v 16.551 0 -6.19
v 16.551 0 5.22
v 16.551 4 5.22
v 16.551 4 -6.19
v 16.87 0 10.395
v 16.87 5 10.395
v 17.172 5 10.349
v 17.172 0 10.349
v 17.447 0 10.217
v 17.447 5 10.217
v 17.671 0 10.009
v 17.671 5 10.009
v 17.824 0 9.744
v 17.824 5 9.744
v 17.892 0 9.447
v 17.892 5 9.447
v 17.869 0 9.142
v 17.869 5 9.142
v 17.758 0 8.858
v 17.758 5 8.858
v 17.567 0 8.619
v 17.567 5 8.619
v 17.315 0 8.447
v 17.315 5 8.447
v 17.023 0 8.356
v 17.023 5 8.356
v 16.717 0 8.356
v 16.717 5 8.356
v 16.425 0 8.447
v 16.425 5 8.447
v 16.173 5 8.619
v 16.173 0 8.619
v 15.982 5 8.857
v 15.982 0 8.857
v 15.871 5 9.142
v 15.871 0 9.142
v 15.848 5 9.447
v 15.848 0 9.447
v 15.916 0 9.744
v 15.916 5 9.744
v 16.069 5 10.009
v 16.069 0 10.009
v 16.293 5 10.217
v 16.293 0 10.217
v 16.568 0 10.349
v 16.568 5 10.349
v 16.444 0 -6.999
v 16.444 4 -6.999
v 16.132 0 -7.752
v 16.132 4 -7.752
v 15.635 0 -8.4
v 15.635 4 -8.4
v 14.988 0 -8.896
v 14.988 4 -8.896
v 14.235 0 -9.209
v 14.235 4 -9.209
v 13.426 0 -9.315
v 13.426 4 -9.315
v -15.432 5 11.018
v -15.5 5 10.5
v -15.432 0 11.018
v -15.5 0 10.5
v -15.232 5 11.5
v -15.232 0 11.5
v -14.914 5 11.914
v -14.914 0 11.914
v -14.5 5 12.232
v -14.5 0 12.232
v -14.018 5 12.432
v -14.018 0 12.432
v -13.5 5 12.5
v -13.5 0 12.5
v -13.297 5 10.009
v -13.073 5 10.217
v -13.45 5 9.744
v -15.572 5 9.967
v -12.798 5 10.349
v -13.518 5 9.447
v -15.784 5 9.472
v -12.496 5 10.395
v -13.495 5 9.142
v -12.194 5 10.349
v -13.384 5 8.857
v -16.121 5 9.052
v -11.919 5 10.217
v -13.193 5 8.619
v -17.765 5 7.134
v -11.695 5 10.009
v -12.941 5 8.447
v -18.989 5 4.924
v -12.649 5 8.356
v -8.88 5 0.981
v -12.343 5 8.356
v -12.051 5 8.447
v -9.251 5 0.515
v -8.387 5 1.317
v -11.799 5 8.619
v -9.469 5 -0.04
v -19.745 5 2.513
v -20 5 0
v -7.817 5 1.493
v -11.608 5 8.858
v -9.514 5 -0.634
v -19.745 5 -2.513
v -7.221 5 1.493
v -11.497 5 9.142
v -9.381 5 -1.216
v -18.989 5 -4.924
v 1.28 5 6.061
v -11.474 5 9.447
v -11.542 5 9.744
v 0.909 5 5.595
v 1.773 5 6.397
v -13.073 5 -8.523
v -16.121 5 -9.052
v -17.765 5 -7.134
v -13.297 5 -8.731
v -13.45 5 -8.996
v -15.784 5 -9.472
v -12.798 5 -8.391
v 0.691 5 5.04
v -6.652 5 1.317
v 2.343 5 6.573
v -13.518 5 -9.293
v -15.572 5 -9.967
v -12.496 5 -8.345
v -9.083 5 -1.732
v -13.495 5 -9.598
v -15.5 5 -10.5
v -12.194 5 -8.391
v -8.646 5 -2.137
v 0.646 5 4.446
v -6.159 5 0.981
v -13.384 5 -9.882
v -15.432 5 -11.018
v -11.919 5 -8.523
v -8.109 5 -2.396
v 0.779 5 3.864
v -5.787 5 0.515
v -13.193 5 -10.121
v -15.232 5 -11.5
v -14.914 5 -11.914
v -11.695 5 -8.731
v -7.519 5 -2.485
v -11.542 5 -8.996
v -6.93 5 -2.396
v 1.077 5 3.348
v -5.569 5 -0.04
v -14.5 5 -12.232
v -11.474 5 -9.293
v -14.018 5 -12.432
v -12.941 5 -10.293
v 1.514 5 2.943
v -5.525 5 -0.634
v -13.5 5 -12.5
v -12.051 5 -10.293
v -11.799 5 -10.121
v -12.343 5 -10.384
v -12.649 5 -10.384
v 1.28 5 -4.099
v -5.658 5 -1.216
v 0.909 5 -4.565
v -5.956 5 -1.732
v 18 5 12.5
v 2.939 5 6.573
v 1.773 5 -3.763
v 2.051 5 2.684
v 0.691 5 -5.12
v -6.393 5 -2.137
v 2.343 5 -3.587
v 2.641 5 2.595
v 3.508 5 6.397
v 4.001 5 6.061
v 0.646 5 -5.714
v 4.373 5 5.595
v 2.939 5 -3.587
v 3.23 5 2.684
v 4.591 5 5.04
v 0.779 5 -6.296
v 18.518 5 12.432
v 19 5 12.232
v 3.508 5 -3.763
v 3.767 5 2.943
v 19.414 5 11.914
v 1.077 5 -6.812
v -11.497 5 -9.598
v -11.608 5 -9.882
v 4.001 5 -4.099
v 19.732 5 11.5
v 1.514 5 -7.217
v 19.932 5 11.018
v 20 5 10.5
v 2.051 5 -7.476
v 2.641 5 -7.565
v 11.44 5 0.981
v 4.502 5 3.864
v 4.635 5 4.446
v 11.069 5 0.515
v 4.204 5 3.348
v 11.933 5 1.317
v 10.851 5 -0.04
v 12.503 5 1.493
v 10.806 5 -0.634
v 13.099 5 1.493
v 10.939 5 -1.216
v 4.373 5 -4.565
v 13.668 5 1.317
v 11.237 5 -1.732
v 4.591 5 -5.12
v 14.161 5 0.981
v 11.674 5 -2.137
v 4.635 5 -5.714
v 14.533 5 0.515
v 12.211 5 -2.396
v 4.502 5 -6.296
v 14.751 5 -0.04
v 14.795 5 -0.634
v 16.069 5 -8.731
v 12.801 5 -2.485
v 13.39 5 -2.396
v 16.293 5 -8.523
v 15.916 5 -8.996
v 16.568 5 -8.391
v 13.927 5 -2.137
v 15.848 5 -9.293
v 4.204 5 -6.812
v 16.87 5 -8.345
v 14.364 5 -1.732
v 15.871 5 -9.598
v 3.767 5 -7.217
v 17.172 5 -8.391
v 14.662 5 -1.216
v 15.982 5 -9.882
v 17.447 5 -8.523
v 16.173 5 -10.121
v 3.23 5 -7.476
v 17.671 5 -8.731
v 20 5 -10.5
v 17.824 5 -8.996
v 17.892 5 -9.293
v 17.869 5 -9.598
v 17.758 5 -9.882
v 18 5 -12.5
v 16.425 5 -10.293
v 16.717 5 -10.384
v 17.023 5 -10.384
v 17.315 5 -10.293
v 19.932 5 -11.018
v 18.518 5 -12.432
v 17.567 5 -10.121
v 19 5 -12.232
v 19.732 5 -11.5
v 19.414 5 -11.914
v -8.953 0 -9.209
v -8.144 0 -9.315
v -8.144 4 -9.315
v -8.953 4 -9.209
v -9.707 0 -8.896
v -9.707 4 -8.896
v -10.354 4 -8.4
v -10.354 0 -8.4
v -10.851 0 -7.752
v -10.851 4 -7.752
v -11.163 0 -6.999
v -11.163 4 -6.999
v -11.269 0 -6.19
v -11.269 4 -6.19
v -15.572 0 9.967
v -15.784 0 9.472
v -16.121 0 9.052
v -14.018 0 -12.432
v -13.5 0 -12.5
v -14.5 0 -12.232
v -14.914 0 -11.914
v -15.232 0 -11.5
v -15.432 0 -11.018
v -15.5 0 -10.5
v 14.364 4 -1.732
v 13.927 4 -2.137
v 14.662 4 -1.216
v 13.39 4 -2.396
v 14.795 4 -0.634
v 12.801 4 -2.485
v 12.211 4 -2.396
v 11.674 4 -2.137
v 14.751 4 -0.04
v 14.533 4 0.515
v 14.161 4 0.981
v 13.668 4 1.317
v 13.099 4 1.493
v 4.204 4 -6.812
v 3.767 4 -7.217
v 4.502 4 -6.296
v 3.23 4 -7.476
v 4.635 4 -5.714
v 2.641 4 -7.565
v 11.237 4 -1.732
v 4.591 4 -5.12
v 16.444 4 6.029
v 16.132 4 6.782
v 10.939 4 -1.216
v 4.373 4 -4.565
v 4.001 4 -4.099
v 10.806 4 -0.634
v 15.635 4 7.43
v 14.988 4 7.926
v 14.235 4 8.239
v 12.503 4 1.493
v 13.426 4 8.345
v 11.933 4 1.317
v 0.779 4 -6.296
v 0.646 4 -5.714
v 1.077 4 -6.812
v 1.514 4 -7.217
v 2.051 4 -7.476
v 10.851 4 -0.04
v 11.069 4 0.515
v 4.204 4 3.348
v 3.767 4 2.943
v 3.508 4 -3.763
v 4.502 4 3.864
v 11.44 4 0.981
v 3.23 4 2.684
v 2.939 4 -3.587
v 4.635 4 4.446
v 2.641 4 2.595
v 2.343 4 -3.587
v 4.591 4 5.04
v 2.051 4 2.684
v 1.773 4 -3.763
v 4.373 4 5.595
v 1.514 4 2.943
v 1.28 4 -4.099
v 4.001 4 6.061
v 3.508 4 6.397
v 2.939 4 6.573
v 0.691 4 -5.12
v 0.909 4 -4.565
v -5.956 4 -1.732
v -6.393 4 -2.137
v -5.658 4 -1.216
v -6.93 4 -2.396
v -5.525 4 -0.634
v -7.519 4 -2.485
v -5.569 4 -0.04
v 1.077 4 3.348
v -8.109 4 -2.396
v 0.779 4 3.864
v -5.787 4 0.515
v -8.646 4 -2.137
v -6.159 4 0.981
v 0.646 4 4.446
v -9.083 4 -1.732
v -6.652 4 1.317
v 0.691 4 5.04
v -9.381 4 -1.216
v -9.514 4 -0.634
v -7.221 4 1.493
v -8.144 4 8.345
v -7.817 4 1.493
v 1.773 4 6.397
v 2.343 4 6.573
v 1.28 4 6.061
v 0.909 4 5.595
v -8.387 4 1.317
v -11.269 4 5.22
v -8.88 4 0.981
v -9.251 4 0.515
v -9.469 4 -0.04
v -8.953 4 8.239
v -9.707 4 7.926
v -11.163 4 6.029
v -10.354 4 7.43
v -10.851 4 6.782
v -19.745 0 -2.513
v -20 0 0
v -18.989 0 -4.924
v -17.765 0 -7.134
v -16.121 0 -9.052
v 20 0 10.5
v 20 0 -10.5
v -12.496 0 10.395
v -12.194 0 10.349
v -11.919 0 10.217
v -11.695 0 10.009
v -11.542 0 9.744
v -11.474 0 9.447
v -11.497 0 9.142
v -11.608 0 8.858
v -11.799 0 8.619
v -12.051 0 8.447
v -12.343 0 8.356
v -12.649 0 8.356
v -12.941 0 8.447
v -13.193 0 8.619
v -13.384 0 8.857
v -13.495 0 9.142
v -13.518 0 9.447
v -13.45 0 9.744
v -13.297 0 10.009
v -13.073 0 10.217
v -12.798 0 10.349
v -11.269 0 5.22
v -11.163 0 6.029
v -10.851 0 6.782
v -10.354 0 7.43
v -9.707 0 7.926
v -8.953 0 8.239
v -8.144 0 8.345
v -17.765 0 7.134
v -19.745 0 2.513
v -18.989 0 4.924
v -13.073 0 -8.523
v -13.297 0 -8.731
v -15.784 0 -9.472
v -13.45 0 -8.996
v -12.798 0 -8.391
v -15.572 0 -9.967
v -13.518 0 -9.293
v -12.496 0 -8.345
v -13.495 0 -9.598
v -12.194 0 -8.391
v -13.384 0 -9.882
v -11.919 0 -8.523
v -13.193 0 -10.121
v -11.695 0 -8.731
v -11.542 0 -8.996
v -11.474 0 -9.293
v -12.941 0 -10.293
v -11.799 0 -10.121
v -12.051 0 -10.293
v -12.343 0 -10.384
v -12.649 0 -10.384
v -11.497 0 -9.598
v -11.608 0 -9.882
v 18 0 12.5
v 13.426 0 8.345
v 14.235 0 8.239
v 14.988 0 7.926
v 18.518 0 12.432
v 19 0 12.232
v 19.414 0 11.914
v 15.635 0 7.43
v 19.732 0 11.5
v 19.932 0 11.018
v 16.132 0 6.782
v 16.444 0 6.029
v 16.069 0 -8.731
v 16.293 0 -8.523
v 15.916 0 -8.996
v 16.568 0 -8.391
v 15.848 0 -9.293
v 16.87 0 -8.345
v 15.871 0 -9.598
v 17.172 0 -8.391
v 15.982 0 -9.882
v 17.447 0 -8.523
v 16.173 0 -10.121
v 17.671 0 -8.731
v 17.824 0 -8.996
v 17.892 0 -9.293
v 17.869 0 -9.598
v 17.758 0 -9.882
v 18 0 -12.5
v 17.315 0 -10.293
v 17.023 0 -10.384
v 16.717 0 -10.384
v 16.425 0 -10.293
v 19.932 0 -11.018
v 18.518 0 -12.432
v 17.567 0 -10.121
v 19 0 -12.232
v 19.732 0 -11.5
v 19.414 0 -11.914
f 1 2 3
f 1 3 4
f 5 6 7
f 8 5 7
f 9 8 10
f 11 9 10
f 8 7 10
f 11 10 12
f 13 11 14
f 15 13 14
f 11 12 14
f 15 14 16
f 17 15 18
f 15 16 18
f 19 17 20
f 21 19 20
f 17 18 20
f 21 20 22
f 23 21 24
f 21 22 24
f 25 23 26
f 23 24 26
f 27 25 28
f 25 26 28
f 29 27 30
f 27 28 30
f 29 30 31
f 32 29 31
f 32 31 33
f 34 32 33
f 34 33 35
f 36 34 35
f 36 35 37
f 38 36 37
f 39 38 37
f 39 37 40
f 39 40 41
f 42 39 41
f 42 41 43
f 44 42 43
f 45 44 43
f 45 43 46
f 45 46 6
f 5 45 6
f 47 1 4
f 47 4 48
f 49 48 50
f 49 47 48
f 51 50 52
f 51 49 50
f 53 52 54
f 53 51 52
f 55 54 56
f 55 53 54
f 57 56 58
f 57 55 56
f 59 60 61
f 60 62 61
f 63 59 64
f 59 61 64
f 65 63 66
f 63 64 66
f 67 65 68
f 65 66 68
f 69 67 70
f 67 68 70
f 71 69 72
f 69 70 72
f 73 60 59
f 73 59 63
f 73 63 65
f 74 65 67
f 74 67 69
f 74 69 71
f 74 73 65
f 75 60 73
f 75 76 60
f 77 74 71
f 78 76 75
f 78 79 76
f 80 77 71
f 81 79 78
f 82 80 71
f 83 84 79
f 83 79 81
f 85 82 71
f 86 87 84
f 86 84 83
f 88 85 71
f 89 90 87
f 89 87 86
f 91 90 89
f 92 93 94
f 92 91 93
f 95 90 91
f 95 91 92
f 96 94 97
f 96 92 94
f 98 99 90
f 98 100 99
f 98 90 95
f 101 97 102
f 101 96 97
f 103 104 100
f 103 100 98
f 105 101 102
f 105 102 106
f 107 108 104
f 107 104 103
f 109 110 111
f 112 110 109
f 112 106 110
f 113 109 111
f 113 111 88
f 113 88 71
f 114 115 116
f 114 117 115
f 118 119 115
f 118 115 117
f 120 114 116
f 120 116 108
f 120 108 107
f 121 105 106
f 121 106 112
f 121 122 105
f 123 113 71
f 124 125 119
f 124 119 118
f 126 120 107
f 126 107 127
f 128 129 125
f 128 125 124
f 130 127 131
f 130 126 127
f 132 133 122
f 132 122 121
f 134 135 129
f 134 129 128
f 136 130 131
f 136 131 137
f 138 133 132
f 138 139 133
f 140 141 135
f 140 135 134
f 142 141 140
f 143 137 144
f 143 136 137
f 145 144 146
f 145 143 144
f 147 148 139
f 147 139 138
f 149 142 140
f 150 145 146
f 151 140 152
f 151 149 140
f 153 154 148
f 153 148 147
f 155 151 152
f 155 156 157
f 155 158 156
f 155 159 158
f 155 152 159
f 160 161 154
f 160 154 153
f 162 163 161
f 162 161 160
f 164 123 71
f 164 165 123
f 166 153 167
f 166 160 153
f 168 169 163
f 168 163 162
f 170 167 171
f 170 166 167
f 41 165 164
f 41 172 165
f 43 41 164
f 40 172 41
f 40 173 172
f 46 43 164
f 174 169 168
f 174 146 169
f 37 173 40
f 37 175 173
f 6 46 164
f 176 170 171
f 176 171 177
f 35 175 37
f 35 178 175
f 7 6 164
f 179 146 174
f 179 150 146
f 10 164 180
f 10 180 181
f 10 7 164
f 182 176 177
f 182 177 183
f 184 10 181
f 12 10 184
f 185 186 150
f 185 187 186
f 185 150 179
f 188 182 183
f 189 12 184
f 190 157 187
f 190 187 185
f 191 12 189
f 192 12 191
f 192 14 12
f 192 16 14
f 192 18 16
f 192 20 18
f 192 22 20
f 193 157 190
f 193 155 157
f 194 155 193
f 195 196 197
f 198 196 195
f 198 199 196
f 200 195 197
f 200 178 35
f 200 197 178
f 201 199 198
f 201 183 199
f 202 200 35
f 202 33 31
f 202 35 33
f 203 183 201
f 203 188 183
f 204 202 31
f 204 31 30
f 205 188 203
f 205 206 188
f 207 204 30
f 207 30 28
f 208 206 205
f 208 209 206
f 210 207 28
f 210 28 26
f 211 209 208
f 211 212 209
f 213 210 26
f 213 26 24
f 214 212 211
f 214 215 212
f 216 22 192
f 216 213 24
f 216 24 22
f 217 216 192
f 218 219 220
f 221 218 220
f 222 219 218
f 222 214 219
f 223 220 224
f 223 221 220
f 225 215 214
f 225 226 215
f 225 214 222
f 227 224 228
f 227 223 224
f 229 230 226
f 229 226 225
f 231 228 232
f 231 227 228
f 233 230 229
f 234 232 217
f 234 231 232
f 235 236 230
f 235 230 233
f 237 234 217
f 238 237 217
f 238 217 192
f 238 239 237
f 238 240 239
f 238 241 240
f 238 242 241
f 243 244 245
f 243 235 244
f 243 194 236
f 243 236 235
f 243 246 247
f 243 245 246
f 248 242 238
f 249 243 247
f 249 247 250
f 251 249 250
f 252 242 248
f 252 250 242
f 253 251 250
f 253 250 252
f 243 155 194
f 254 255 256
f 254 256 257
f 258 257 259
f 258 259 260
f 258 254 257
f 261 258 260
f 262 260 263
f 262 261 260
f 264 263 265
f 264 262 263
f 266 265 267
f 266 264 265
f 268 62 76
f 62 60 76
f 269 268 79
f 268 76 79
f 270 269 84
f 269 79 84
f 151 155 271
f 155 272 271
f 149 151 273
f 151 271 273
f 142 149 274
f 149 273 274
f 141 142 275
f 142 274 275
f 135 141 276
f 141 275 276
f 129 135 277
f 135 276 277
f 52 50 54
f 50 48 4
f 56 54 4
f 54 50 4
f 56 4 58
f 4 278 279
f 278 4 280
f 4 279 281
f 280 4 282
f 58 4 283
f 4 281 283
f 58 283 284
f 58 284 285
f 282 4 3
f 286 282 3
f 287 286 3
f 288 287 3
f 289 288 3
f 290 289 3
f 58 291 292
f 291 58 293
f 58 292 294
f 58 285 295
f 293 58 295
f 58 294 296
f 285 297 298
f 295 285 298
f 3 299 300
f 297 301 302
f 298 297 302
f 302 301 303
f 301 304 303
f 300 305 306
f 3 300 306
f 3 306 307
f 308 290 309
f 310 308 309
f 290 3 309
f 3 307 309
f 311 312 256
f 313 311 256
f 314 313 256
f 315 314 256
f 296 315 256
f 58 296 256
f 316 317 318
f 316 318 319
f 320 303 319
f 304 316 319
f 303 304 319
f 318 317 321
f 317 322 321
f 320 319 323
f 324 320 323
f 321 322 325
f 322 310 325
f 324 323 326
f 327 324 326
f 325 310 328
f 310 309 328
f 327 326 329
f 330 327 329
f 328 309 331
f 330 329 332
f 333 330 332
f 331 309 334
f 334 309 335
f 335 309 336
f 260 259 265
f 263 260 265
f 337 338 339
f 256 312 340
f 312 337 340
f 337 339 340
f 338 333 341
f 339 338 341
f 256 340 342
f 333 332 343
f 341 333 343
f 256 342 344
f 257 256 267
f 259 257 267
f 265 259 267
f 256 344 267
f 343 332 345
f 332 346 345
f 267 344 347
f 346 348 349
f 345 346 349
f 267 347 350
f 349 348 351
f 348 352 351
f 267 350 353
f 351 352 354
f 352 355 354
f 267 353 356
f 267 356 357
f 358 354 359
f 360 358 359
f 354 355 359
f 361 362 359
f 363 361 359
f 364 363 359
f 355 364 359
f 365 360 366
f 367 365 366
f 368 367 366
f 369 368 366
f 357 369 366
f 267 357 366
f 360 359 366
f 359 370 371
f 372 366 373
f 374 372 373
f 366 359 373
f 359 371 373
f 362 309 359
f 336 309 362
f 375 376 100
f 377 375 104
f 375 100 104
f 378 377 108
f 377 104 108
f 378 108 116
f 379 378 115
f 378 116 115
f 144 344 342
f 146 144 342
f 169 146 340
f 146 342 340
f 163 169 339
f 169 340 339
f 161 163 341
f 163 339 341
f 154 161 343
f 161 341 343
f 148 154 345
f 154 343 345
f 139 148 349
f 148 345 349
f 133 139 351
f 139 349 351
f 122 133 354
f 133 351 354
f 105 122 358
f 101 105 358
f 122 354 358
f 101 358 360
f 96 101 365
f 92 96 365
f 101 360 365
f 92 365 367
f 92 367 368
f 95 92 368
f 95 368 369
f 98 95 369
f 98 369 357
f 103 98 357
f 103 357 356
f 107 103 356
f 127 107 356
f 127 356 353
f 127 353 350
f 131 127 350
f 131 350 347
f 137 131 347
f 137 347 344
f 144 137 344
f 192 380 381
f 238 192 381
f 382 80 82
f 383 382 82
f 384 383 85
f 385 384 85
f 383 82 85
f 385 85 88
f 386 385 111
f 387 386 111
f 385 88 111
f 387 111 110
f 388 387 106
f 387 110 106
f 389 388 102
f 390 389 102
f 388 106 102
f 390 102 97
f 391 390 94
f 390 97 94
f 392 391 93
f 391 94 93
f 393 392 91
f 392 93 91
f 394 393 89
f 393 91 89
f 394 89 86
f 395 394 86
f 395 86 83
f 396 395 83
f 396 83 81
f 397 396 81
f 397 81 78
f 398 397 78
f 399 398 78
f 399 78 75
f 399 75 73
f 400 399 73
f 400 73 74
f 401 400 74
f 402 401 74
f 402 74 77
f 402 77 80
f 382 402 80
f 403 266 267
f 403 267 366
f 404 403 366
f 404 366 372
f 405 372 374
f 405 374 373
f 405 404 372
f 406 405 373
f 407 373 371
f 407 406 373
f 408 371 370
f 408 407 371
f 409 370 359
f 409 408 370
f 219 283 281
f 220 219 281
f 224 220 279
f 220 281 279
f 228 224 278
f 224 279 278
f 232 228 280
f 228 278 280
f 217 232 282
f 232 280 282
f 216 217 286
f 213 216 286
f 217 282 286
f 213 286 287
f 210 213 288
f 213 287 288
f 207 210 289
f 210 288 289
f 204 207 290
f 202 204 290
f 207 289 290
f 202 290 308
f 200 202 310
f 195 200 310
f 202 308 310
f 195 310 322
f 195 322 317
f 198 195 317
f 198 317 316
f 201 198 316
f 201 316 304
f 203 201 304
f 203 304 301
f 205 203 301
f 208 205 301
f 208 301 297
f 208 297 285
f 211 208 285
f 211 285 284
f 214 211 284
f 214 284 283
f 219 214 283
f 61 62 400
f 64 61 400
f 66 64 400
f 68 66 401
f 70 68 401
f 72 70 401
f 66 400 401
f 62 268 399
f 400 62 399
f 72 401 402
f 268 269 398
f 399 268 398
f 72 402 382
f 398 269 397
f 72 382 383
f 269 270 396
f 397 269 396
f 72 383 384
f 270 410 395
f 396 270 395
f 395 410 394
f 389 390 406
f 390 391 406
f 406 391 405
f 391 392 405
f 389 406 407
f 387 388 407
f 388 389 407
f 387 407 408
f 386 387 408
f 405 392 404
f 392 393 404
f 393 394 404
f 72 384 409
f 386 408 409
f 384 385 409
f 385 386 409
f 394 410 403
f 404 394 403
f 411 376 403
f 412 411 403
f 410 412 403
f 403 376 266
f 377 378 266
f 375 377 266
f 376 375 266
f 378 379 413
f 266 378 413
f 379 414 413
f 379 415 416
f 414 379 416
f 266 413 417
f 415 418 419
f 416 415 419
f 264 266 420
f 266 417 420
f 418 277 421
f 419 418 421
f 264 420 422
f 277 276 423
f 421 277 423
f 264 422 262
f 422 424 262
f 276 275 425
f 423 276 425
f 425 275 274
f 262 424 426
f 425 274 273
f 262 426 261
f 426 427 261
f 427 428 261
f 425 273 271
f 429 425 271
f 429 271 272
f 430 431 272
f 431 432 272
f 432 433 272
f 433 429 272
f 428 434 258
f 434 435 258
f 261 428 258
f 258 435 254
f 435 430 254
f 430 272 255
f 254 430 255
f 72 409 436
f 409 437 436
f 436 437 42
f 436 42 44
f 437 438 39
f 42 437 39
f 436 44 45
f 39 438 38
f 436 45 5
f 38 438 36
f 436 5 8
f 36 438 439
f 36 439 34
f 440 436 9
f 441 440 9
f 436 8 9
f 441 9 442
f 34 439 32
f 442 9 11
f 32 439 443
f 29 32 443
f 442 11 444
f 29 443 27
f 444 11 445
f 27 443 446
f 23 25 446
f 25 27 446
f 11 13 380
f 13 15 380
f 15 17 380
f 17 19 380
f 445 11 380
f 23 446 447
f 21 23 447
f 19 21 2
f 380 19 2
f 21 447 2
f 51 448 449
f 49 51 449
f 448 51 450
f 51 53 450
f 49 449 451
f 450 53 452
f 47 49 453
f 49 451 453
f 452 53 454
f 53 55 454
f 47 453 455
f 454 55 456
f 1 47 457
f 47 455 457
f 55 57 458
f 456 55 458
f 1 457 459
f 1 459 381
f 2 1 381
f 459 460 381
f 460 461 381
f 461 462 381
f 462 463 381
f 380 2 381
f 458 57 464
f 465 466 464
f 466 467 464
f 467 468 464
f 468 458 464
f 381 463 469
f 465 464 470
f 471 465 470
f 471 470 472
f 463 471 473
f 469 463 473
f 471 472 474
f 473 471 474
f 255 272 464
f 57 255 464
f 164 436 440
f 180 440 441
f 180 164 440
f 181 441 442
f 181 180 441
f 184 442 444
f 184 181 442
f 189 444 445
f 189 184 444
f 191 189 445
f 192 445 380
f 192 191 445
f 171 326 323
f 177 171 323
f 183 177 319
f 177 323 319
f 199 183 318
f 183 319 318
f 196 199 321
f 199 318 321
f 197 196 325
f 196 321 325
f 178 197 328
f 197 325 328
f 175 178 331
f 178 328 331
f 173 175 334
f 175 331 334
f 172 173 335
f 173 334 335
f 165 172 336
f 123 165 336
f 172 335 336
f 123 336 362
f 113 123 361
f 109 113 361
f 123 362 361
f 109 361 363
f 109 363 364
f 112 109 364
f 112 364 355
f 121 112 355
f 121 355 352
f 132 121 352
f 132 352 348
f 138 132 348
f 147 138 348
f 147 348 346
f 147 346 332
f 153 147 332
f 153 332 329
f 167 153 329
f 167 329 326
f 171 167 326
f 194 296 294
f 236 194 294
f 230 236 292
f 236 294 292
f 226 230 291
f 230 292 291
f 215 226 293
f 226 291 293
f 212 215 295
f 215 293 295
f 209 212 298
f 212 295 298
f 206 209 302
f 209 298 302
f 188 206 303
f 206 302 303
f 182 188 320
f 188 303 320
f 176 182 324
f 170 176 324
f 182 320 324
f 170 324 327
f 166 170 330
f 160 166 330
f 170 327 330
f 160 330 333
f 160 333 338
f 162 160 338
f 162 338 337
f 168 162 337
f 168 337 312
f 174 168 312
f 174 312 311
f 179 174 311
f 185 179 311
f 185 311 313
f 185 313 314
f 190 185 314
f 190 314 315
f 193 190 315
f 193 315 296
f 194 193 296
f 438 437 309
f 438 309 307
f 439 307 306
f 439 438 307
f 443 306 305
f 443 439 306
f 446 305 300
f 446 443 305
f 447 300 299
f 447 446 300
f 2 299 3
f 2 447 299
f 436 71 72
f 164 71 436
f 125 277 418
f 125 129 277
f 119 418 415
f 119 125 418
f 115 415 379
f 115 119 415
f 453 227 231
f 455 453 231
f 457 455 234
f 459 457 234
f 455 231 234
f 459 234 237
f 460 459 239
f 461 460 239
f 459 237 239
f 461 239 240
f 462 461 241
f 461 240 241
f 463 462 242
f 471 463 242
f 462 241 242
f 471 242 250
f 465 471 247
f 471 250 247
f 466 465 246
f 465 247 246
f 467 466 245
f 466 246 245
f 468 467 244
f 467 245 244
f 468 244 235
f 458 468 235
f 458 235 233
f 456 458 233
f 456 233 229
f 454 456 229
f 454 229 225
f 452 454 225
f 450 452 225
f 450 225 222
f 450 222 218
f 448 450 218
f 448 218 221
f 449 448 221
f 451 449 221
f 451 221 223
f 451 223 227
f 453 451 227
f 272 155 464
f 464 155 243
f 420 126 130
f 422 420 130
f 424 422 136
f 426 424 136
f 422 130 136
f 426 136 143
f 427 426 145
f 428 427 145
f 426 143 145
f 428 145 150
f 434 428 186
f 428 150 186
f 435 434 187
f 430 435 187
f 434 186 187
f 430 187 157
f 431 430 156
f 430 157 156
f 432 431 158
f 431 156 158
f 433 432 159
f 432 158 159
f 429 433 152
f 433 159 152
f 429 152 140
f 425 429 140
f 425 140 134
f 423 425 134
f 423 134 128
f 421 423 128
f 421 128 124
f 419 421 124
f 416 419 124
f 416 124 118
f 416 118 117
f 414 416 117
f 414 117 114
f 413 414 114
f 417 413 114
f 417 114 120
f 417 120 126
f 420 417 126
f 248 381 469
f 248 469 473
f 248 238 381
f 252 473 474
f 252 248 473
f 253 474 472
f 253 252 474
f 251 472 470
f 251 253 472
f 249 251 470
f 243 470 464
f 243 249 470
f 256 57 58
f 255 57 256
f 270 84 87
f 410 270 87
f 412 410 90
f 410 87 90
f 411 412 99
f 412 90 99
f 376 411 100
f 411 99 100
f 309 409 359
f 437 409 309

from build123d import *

# Parameters (mm, degrees)
SKETCH1_W           = 40
SKETCH1_H           = 25
BOSS_EXTRUDE1_DEPTH = 5
CUT_EXTRUDE1_DEPTH  = 25.109126902
SKETCH4_W           = 8
SKETCH4_H           = 25
BOSS_EXTRUDE2_DEPTH = 5
FILLET1_R           = 2
SKETCH5_R           = 1.025
CUT_EXTRUDE2_DEPTH  = 25.109126902
SKETCH6_R           = 2
CUT_EXTRUDE3_DEPTH  = 25.109126902
CUT_EXTRUDE4_DEPTH  = 4


with BuildPart() as part:
    # Sketch1 → Boss-Extrude1 (new body)
    with BuildSketch(Plane(origin=(0, 0, 0), x_dir=(1, 0, 0), z_dir=(0, 1, 0))):
        Rectangle(SKETCH1_W, SKETCH1_H)
    extrude(amount=BOSS_EXTRUDE1_DEPTH)

    # Sketch2 → Cut-Extrude1 (cut, through all)
    with BuildSketch(Plane(origin=(0, 5, 0), x_dir=(1, 0, 0), z_dir=(0, 1, 0))):
        with BuildLine():
            ThreePointArc((-20, 0), (-16.338834759, 8.83883477), (-7.499999984, 12.5))
            Line((-7.499999984, 12.5), (-20, 12.5))
            Line((-20, 12.5), (-20, 0))
        make_face()
        with BuildLine():
            Line((-20, -12.5), (-7.50000001, -12.5))
            ThreePointArc((-7.50000001, -12.5), (-16.338834768, -8.838834761), (-20, 0))
            Line((-20, 0), (-20, -12.5))
        make_face()
    extrude(amount=-CUT_EXTRUDE1_DEPTH, mode=Mode.SUBTRACT)

    # Sketch4 → Boss-Extrude2 (add, through all)
    with BuildSketch(Plane(origin=(0, 5, 0), x_dir=(1, 0, 0), z_dir=(0, 1, 0))):
        with Locations((-11.5, 0)):
            Rectangle(SKETCH4_W, SKETCH4_H)
    extrude(amount=-BOSS_EXTRUDE2_DEPTH)

    # Fillet1
    fillet1_edges = [part.edges().sort_by_distance(p)[0] for p in [
        (20, 2.5, 12.5),
        (20, 2.5, -12.5),
        (-15.5, 2.5, -12.5),
        (-15.5, 2.5, 12.5),
        (-15.5, 2.5, 9.604686356),
        (-15.5, 2.5, -9.604686356),
    ]]
    fillet(fillet1_edges, radius=FILLET1_R - 0.0001)  # a hair under: the kernel refuses the full size

    # Sketch5 → Cut-Extrude2 (cut, through all)
    with BuildSketch(Plane(origin=(0, 5, 0), x_dir=(1, 0, 0), z_dir=(0, 1, 0))):
        with Locations(Location((-12.496001599, 9.37, 0), (0, 0, 270))):
            Circle(SKETCH5_R)
        with Locations(Location((-12.496001599, -9.37, 0), (0, 0, 270))):
            Circle(SKETCH5_R)
        with Locations(Location((16.87, 9.37, 0), (0, 0, 270))):
            Circle(SKETCH5_R)
        with Locations(Location((16.87, -9.37, 0), (0, 0, 270))):
            Circle(SKETCH5_R)
    extrude(amount=-CUT_EXTRUDE2_DEPTH, mode=Mode.SUBTRACT)

    # Sketch6 → Cut-Extrude3 (cut, through all)
    with BuildSketch(Plane.XZ):
        with Locations(Location((-7.519296648, -0.485, 0), (0, 0, 270))):
            Circle(SKETCH6_R)
        with Locations(Location((2.640703352, 4.595, 0), (0, 0, 270))):
            Circle(SKETCH6_R)
        with Locations(Location((12.800703352, -0.485, 0), (0, 0, 270))):
            Circle(SKETCH6_R)
        with Locations(Location((2.640703352, -5.565, 0), (0, 0, 270))):
            Circle(SKETCH6_R)
    extrude(amount=-CUT_EXTRUDE3_DEPTH, mode=Mode.SUBTRACT)

    # Sketch7 → Cut-Extrude4 (cut)
    with BuildSketch(Plane.XZ):
        with BuildLine():
            Line((-11.269296648, -6.19), (-11.269296648, 5.22))
            ThreePointArc((-11.269296648, 5.22), (-10.354005339, 7.429708691), (-8.144296648, 8.345))
            Line((-8.144296648, 8.345), (13.425703352, 8.345))
            ThreePointArc((13.425703352, 8.345), (15.635412043, 7.429708691), (16.550703352, 5.22))
            Line((16.550703352, 5.22), (16.550703352, -6.19))
            ThreePointArc((16.550703352, -6.19), (15.635412043, -8.399708691), (13.425703352, -9.315))
            Line((13.425703352, -9.315), (-8.144296648, -9.315))
            ThreePointArc((-8.144296648, -9.315), (-10.354005339, -8.399708691), (-11.269296648, -6.19))
        make_face()
    extrude(amount=-CUT_EXTRUDE4_DEPTH, mode=Mode.SUBTRACT)


solid = part.part
